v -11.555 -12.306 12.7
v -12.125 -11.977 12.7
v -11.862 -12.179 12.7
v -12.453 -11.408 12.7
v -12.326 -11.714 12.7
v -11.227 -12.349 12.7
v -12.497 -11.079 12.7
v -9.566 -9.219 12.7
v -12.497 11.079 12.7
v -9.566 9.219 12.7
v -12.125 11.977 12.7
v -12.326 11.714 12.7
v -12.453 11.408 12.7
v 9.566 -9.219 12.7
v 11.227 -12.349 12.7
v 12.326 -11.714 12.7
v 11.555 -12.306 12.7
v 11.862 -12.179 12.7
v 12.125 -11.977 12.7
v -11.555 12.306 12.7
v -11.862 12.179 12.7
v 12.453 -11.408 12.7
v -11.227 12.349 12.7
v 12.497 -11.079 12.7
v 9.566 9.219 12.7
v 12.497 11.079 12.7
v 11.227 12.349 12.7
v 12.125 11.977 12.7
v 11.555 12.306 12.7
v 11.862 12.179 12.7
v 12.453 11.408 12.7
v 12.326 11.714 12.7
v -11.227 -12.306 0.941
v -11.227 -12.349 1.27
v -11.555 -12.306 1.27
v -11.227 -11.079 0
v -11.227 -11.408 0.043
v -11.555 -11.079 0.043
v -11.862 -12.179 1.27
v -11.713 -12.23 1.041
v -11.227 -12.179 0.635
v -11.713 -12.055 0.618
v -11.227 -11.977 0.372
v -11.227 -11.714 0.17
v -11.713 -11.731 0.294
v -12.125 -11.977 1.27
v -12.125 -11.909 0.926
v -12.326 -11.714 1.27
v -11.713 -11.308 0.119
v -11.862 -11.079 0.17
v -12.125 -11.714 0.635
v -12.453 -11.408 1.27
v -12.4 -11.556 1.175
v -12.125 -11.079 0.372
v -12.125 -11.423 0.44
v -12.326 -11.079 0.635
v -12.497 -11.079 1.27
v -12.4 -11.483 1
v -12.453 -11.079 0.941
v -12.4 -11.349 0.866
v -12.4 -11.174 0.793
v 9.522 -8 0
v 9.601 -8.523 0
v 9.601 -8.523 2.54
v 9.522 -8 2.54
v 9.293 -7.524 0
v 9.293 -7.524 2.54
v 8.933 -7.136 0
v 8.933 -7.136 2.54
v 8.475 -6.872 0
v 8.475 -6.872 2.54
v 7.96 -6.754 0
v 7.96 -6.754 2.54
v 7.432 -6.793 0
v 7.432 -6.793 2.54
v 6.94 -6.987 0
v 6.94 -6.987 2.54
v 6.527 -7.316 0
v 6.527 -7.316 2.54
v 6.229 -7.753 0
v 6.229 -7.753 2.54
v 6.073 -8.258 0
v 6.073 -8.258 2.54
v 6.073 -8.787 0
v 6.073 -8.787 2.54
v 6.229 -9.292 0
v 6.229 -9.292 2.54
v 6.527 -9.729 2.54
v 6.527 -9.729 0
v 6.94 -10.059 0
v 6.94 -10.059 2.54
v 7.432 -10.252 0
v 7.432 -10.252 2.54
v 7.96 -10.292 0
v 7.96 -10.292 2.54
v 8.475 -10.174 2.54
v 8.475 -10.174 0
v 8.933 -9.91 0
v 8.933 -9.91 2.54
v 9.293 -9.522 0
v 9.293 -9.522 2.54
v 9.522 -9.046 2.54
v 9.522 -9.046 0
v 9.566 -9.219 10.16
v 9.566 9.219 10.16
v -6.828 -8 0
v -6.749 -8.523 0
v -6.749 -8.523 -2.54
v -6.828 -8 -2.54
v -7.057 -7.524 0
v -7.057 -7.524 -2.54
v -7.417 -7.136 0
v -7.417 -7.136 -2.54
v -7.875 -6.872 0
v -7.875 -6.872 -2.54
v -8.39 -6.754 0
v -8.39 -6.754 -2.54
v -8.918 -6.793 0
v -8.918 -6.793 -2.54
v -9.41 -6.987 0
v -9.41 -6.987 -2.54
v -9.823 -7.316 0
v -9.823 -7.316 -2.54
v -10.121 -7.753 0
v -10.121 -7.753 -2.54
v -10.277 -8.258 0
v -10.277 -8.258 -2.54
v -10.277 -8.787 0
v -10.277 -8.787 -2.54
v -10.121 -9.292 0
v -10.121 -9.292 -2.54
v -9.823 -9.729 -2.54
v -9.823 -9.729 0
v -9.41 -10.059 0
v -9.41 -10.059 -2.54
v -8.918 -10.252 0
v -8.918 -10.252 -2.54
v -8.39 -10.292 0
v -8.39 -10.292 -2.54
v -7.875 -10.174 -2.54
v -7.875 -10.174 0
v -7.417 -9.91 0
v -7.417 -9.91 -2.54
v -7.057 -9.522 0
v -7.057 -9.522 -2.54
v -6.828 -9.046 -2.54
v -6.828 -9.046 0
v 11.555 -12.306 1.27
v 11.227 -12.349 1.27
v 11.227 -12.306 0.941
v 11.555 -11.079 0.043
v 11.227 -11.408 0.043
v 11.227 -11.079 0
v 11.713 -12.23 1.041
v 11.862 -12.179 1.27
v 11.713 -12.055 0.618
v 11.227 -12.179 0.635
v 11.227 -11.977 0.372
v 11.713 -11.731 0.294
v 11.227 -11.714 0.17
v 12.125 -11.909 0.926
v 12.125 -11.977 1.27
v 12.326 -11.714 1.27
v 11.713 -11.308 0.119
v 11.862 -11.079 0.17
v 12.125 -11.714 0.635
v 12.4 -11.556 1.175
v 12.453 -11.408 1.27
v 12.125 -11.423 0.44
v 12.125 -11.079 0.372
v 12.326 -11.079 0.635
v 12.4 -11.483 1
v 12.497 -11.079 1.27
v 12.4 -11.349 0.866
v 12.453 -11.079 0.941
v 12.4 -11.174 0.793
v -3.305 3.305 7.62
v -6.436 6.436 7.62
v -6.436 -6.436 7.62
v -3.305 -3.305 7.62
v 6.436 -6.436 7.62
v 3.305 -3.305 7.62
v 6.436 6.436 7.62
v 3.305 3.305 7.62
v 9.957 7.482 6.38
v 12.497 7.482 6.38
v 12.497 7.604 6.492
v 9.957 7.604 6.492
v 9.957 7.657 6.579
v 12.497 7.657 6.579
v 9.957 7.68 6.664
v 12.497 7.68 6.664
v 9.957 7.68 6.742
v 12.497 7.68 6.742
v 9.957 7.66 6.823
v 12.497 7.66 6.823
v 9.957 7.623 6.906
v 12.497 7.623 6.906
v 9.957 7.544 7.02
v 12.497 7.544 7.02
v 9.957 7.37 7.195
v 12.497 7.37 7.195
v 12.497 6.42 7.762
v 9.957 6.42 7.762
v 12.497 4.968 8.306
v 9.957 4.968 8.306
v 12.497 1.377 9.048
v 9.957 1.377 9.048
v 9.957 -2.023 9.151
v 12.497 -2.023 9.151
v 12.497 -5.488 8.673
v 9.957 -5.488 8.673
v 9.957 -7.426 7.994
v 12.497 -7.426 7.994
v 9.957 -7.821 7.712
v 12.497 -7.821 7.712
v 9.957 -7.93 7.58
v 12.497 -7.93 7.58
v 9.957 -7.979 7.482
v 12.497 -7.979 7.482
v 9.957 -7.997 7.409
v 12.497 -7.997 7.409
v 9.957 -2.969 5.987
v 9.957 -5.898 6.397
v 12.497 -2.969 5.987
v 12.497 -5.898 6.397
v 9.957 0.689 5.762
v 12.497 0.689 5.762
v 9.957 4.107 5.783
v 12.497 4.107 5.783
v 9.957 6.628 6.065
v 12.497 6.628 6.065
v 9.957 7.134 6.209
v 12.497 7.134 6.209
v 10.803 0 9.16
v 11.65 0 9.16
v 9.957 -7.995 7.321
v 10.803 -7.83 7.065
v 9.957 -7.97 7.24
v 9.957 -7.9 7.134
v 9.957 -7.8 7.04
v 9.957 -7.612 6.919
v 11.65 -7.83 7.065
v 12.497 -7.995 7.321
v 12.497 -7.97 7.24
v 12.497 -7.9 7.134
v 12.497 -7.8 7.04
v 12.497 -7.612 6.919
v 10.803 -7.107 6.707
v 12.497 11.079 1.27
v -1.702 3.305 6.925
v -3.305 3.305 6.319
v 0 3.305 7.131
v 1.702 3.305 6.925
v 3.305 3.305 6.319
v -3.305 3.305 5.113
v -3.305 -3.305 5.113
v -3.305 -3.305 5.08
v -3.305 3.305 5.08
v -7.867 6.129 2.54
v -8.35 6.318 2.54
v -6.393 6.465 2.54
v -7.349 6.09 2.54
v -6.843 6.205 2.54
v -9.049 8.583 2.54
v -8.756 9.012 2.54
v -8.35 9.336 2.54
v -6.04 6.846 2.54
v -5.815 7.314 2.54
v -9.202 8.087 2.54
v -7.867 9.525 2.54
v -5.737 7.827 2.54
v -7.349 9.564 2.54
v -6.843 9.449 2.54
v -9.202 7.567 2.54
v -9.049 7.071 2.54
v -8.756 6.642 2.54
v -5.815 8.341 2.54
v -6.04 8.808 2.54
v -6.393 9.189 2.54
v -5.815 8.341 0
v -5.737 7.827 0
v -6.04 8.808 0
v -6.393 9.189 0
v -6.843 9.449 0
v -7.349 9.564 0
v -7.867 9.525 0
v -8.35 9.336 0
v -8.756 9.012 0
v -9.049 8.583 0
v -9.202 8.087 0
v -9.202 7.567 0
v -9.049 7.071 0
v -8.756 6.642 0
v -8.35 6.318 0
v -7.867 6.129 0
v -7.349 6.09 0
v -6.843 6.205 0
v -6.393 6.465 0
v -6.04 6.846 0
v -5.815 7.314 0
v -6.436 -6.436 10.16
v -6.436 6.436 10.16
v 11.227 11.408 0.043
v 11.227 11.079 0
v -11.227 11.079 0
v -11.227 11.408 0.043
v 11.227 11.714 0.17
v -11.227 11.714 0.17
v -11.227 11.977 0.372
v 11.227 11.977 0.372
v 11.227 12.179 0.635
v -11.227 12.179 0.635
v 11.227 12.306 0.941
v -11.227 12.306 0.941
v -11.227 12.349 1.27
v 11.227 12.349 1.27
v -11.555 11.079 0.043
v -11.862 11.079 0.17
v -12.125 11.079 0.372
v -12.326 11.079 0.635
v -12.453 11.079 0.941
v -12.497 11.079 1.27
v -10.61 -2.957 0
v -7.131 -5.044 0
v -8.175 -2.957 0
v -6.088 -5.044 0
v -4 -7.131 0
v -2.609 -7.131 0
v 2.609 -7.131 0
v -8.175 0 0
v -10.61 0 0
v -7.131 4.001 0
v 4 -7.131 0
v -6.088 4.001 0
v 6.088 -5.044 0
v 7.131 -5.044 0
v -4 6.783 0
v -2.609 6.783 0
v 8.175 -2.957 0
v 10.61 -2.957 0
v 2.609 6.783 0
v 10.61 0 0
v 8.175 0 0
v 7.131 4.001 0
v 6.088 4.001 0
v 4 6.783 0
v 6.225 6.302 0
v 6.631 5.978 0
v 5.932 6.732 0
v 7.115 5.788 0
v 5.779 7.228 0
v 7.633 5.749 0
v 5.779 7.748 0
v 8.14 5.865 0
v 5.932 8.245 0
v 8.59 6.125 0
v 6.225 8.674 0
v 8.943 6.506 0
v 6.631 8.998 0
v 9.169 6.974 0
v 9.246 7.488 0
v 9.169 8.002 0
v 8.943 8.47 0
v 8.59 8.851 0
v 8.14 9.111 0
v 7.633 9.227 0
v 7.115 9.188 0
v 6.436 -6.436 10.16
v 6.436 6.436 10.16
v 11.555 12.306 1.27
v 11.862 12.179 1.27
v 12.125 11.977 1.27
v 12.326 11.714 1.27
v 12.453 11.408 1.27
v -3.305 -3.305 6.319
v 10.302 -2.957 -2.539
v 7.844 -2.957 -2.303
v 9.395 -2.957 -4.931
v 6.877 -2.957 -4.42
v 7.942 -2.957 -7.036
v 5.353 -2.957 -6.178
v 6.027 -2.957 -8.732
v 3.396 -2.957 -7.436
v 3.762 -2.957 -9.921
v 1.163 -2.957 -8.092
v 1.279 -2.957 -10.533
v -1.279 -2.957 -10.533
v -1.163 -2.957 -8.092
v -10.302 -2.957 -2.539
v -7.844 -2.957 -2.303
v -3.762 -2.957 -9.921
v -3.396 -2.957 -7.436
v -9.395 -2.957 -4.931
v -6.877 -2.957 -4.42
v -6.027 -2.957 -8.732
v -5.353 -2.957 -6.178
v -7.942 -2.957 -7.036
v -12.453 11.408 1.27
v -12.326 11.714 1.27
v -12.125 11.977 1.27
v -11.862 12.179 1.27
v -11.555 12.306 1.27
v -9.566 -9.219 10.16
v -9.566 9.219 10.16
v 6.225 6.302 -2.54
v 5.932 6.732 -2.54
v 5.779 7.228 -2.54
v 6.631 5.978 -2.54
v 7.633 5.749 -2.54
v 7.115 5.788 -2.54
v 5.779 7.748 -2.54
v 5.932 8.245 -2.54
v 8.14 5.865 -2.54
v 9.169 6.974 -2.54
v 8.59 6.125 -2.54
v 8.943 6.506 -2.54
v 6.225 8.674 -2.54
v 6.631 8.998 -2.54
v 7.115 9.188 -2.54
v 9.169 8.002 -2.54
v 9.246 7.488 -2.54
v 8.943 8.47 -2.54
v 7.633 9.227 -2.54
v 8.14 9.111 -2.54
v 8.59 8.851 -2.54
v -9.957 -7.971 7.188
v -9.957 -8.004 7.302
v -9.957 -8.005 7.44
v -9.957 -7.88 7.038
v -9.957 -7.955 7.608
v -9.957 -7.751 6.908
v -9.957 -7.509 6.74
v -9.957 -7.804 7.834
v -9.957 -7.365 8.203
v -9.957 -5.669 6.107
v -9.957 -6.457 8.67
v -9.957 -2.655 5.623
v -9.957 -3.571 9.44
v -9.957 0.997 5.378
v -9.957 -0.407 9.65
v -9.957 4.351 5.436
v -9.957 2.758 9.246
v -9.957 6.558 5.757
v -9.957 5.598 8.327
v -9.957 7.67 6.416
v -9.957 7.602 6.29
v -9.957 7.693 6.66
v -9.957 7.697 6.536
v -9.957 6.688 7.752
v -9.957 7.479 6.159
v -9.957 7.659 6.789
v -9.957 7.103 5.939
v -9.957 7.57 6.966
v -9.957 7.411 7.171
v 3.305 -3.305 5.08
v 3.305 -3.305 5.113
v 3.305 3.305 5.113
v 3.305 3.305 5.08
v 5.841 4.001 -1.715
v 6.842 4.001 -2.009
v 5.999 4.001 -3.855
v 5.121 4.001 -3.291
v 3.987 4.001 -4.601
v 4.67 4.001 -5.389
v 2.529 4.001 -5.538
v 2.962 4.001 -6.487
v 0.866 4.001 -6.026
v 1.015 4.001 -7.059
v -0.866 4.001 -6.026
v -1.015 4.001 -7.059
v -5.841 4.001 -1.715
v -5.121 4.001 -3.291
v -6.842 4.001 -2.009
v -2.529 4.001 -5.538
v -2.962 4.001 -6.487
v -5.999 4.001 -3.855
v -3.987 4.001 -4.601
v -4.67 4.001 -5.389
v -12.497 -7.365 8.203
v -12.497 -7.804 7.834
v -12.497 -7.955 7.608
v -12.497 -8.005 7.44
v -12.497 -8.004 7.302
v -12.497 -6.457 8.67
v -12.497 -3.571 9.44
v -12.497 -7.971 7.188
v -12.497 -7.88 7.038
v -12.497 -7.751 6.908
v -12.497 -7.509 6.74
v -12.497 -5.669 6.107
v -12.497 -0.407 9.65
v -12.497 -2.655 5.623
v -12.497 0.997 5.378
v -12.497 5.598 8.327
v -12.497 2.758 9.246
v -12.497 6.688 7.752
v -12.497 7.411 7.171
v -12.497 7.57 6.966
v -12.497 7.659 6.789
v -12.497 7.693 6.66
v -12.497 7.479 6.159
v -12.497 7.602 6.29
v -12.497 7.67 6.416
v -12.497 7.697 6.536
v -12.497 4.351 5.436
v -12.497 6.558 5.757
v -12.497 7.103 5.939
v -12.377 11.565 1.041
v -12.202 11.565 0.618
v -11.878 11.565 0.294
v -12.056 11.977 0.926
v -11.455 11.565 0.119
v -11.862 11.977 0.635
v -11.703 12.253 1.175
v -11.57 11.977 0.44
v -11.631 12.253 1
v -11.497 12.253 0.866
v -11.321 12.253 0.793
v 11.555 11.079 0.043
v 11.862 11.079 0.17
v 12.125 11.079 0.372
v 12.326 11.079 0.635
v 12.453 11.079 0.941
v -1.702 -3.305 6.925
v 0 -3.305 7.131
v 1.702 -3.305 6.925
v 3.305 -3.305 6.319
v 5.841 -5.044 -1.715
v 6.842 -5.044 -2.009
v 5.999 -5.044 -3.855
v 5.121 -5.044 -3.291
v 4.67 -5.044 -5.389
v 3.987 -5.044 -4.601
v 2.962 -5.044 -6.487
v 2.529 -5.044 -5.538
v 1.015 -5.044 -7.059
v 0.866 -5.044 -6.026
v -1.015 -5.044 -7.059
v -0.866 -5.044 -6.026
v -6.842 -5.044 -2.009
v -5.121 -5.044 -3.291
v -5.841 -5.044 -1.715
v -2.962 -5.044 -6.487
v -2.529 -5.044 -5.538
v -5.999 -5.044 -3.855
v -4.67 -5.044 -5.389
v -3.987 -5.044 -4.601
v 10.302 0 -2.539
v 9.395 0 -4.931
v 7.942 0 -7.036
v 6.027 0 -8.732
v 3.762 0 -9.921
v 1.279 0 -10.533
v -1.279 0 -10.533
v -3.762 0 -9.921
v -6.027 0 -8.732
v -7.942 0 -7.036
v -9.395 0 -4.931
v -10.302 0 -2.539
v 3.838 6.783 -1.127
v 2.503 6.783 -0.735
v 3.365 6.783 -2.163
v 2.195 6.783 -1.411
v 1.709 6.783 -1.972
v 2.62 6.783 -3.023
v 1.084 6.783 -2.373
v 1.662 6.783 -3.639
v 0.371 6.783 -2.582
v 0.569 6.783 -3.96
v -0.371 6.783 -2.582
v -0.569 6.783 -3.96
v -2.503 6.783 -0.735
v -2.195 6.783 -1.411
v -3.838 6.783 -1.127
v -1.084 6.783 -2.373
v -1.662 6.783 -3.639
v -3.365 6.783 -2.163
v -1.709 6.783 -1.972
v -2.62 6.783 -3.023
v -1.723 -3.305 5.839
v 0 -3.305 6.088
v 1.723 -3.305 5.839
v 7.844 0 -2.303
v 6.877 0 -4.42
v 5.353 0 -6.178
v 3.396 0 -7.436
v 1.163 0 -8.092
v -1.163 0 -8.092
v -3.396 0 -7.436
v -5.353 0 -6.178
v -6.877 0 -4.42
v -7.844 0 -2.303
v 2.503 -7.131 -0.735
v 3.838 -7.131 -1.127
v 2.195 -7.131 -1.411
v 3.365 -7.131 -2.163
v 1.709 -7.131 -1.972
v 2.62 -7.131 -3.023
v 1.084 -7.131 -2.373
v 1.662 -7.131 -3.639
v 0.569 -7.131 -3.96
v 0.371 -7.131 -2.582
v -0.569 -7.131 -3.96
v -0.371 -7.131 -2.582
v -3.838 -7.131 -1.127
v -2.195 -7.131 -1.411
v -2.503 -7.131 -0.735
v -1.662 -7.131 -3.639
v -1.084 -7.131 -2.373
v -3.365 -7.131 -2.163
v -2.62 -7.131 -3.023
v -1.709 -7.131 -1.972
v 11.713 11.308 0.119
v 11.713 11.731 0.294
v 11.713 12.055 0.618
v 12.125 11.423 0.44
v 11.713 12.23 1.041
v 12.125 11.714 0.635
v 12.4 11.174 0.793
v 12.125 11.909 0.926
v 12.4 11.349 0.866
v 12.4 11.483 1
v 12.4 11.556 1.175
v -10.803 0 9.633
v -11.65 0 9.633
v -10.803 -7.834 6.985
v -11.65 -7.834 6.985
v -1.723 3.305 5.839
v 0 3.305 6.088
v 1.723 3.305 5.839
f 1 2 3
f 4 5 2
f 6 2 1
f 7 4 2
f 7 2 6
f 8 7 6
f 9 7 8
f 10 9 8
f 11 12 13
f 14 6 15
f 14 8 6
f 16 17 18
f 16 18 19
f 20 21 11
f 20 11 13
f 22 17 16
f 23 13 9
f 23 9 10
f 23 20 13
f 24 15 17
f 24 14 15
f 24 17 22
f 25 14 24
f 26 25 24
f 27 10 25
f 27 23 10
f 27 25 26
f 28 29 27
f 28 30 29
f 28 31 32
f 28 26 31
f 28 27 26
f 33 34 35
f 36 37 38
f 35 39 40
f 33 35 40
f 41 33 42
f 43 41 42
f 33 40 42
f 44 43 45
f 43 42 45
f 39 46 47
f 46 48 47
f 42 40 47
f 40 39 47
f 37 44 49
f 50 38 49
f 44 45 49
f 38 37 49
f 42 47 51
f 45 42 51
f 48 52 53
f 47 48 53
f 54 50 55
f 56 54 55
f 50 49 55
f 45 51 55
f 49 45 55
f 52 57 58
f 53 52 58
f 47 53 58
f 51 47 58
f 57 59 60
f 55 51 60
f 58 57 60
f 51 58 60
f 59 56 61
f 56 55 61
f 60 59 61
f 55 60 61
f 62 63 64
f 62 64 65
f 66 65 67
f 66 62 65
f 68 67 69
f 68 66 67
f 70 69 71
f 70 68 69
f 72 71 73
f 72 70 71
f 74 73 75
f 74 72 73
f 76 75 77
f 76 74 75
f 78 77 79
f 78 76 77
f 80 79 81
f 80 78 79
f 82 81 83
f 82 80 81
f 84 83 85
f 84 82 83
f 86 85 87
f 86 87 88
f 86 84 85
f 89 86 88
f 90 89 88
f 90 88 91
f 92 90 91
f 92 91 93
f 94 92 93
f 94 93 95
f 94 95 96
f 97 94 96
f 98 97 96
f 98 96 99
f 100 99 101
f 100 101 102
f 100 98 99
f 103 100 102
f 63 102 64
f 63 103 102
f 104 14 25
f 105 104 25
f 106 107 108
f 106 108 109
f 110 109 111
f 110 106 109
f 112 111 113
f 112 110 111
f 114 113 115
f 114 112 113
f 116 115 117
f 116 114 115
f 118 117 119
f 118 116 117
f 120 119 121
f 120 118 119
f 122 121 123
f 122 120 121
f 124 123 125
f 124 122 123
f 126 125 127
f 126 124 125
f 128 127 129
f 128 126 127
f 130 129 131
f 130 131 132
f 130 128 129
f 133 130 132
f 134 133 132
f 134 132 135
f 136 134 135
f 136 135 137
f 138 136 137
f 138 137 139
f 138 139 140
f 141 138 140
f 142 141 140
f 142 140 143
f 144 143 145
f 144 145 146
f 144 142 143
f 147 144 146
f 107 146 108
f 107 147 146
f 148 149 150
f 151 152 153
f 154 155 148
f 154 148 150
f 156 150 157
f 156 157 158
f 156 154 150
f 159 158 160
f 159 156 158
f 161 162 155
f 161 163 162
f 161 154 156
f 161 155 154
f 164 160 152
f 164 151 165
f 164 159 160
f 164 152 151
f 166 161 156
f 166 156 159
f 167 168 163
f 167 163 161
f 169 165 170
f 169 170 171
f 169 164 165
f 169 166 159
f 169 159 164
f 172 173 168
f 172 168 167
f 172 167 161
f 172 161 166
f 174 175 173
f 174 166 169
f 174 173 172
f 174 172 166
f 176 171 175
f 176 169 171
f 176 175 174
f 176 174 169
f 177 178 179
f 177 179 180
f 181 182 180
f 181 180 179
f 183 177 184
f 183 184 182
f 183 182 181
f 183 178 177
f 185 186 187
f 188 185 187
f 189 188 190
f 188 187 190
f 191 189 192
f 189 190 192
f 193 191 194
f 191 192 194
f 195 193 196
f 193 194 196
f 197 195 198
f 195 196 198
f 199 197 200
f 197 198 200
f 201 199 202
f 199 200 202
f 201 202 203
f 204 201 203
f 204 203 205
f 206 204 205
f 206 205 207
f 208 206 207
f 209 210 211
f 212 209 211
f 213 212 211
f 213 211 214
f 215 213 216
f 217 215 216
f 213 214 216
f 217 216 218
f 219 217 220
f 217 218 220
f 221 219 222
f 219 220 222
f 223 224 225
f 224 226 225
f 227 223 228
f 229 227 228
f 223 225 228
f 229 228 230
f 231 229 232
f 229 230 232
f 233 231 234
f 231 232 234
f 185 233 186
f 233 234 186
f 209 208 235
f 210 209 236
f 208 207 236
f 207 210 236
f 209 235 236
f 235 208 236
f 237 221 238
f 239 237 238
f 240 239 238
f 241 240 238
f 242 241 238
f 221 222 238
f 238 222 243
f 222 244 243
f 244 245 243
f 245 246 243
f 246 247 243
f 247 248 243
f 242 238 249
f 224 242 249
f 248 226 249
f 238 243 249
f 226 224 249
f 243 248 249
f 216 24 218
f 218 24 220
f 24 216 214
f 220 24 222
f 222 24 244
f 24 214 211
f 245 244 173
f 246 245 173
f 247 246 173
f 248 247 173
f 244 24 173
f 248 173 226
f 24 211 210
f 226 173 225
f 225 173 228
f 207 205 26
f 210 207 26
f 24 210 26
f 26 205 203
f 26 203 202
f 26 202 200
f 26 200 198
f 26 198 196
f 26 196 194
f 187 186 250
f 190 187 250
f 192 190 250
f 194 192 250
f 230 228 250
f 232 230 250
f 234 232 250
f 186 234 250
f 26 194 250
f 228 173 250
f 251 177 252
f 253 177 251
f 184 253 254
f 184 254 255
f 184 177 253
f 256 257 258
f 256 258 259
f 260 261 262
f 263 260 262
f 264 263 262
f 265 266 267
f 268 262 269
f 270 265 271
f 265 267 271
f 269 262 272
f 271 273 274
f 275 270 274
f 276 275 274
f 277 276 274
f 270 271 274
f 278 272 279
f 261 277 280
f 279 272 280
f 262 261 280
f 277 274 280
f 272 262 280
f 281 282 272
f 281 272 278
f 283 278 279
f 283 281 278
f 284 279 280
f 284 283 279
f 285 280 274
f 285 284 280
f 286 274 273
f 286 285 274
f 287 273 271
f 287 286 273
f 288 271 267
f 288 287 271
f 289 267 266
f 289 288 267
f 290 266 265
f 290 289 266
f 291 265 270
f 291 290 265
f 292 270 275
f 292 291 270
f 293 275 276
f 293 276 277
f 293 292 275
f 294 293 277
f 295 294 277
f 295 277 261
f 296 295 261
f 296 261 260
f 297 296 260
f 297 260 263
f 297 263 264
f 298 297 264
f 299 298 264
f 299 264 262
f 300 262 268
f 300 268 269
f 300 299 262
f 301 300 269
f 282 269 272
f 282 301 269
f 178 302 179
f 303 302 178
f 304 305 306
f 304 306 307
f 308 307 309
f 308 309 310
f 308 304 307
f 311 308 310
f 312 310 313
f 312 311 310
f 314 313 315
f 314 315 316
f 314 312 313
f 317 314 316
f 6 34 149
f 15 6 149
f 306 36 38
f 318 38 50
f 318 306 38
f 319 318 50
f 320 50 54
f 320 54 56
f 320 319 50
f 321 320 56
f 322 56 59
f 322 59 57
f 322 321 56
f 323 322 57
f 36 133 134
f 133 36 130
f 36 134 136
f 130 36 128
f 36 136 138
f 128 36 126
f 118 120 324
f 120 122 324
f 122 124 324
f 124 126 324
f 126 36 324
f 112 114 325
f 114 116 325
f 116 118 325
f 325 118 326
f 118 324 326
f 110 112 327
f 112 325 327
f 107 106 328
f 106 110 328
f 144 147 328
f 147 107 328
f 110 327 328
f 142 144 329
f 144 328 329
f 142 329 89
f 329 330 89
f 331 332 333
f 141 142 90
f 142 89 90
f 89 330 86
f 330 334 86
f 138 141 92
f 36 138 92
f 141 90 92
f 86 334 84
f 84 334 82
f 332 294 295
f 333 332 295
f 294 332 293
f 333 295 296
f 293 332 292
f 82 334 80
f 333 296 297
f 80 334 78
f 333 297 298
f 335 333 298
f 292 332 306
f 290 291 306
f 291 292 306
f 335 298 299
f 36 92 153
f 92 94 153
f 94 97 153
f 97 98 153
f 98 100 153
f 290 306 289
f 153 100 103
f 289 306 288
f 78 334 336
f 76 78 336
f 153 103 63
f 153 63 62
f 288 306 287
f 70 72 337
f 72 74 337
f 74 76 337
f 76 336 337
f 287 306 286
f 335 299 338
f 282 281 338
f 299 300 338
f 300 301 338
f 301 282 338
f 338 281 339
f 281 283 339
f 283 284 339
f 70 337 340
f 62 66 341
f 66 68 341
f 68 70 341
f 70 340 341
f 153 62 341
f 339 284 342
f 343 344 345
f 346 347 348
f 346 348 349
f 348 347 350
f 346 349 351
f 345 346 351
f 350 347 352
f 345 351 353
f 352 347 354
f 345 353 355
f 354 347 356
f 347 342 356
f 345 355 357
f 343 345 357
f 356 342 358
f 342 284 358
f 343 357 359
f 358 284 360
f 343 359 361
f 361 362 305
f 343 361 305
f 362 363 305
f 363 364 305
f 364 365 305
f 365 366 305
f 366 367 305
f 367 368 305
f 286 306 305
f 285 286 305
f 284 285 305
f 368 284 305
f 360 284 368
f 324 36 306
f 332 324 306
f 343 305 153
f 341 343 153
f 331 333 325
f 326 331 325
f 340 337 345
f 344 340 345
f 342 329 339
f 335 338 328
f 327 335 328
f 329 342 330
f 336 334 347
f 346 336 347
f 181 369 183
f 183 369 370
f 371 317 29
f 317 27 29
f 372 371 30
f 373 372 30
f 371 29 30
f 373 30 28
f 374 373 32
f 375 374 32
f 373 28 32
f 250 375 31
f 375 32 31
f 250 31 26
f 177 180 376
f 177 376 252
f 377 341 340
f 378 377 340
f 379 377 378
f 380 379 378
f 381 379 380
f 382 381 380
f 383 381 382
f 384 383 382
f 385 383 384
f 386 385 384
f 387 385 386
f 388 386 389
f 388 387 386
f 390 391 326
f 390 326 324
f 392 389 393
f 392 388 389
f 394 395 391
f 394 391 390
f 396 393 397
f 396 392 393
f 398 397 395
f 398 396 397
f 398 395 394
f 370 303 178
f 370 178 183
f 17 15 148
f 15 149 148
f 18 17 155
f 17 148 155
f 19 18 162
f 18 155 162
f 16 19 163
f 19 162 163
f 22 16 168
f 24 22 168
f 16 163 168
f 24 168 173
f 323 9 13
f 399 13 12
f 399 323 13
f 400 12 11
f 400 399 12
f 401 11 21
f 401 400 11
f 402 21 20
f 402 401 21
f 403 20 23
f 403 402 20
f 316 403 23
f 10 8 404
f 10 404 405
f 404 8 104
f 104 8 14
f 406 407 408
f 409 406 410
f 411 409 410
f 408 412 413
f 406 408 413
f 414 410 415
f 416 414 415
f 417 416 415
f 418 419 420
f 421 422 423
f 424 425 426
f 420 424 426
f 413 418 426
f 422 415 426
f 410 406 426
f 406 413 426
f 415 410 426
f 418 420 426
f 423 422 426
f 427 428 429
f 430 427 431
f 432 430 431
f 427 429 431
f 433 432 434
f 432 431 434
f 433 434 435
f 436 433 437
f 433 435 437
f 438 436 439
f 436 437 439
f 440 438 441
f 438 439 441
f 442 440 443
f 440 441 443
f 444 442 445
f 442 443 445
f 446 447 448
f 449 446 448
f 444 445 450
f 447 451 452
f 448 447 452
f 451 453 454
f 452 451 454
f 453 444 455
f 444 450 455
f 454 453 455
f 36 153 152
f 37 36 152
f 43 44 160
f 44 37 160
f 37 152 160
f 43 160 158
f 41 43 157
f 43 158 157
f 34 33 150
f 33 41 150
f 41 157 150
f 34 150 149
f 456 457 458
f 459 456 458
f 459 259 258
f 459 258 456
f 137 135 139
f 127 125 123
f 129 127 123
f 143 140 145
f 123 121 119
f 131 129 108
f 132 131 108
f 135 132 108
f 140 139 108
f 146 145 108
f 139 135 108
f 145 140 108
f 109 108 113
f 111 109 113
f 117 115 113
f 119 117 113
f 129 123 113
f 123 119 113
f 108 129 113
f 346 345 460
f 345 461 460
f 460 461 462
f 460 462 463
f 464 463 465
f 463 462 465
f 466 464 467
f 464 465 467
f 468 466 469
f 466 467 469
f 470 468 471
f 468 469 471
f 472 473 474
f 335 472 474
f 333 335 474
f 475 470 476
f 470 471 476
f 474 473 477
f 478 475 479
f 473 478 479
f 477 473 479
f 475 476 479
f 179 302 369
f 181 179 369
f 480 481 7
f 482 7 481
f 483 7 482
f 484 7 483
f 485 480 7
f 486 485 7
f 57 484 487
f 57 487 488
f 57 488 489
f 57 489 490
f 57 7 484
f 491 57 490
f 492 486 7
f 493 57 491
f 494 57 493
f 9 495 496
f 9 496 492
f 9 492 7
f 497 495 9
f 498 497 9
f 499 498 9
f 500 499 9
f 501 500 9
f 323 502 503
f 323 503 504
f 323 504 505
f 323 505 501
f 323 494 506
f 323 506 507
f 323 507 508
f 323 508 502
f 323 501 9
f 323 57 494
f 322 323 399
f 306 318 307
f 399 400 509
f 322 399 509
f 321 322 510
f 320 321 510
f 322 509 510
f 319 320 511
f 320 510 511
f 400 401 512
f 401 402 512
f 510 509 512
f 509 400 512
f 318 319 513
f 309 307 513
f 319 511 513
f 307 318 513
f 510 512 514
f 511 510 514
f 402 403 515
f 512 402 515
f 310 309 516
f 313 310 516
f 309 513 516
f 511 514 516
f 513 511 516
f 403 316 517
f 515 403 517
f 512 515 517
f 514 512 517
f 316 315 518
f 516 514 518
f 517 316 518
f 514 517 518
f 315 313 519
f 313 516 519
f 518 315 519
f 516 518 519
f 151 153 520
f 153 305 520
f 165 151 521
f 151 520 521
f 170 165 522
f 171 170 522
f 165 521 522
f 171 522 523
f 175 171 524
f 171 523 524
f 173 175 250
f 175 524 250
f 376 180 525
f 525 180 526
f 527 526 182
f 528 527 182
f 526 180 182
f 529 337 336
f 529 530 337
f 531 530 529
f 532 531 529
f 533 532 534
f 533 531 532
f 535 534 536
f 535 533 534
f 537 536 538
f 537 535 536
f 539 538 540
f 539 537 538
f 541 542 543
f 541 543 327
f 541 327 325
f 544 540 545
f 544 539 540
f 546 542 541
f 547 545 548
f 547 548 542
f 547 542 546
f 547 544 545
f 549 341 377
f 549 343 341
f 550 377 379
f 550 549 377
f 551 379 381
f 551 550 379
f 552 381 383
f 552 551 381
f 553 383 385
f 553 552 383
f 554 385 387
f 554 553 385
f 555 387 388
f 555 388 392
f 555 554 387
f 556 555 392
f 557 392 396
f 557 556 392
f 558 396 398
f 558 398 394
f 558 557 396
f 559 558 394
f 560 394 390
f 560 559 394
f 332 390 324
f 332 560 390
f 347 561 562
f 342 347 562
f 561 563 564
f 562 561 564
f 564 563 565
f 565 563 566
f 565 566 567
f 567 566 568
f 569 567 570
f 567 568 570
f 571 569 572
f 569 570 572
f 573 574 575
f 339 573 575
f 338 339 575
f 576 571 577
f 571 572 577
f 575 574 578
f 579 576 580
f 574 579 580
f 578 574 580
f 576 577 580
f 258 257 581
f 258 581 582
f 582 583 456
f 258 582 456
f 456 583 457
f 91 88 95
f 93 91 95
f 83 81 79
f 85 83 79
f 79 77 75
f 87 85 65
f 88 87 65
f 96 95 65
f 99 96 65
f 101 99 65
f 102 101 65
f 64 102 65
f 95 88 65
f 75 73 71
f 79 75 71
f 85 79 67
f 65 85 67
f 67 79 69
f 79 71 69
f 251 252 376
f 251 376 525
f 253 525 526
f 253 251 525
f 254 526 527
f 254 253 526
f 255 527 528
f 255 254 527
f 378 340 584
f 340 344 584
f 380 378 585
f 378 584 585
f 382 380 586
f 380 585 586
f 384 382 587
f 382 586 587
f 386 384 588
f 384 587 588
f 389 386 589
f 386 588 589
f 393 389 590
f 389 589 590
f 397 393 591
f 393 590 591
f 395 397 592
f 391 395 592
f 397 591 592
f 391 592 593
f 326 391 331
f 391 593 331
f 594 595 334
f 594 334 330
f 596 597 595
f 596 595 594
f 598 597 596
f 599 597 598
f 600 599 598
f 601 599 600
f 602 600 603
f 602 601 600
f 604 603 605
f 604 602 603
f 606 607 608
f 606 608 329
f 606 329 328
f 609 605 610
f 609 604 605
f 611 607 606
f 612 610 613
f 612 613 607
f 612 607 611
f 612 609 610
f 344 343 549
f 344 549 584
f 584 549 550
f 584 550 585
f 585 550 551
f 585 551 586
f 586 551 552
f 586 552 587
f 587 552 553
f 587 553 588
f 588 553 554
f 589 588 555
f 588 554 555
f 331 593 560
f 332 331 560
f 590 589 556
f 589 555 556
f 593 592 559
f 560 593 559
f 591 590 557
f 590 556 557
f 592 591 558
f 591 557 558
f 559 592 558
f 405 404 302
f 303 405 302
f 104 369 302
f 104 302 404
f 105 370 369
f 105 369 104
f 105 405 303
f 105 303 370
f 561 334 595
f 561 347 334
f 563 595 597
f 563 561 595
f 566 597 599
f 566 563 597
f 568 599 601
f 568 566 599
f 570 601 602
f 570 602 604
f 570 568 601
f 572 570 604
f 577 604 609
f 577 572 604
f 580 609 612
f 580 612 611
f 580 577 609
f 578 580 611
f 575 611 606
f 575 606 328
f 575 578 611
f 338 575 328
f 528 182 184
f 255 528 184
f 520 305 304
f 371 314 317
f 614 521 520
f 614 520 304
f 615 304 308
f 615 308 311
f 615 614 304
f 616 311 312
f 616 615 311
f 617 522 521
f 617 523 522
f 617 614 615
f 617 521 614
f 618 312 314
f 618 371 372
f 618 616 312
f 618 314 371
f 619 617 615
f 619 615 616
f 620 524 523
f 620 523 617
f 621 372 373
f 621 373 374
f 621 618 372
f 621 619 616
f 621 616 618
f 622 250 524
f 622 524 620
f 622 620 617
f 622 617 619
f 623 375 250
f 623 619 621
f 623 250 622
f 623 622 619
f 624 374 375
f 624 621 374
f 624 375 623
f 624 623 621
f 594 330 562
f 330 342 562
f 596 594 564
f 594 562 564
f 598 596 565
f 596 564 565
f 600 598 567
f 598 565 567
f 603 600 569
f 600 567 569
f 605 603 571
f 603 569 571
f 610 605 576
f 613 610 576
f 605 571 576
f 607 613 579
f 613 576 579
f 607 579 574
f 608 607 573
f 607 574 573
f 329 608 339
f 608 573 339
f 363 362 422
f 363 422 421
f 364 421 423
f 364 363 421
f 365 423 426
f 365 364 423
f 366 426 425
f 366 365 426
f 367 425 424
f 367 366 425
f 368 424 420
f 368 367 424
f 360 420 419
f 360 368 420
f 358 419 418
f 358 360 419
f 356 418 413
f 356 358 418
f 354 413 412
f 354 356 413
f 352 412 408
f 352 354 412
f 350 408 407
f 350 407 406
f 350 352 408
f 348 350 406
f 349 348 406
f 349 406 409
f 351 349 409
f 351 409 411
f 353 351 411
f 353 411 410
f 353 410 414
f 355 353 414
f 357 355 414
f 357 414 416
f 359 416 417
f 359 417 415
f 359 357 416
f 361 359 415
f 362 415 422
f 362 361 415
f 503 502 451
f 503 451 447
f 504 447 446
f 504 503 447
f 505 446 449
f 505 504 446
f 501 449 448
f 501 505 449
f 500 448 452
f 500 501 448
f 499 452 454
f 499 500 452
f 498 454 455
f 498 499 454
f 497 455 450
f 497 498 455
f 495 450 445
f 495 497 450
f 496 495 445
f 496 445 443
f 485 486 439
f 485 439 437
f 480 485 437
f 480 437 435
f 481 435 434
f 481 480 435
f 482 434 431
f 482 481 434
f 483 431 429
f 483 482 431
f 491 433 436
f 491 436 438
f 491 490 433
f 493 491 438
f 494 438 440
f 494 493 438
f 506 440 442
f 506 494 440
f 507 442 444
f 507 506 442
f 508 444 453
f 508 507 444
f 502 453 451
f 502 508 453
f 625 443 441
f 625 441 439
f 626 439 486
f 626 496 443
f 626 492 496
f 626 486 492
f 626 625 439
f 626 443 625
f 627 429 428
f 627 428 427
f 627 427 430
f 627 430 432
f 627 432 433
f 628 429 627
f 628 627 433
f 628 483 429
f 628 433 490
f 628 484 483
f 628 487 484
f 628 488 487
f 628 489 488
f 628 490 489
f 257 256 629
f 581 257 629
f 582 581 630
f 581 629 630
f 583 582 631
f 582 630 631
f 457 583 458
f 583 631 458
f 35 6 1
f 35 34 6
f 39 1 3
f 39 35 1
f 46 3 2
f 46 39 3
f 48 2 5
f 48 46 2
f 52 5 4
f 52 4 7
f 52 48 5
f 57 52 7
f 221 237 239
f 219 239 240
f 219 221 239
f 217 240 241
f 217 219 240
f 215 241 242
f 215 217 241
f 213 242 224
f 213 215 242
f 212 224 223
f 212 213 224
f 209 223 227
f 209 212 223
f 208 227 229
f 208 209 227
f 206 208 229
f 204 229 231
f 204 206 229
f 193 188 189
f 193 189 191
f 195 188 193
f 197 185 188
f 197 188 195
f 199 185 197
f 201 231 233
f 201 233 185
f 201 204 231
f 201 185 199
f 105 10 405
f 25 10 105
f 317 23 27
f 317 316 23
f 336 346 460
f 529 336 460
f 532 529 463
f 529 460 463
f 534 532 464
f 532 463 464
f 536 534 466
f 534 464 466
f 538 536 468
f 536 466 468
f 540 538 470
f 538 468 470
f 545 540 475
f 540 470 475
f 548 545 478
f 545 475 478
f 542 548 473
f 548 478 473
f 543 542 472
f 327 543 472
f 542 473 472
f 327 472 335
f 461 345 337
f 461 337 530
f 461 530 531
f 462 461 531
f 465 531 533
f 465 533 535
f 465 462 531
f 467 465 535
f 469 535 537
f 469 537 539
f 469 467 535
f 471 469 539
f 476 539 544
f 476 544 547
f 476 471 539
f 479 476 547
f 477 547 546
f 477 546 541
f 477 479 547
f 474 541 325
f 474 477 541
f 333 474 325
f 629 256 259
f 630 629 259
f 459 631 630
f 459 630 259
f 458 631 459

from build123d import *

# Parameters (mm, degrees)
F0_W      = 24.9930880964
F0_H      = 24.6987380087
F1_DEPTH  = 12.7
F2_W      = 19.1328264773
F2_H      = 18.4370856732
F3_DEPTH  = 2.54
F4_W      = 12.8711769357
F4_H      = 12.8711741418
F5_DEPTH  = 2.54
F6_W      = 6.6095204093
F6_H      = 6.6095213406
F7_DEPTH  = 2.54
F8_W      = 1.3914771844
F8_H      = 13.9147825539
F9_ANGLE  = 180
F10_W     = 1.0436060838
F10_H     = 9.0446090326
F12_W     = 2.4350825697
F12_H     = 2.9568914324
F13_ANGLE = 180
F14_R     = 1.27
F15_R     = 1.27
F16_R     = 1.27
F17_R     = 1.27
F18_R     = 1.7737932194
F18_R_2   = 1.7435308636
F19_DEPTH = 2.54
F18_R_3   = 1.7420613373
F18_R_4   = 1.7737943152
F20_DEPTH = 2.54
F22_DEPTH = 2.54
F24_DEPTH = 2.54


with BuildPart() as f1:
    # F0 (on Top) → F1 (new body)
    with BuildSketch(Plane.XY):
        Rectangle(F0_W, F0_H)
    extrude(amount=F1_DEPTH)

    # F2 (on face) → F3 (cut)
    with BuildSketch(Plane.XY.offset(12.7)):
        Rectangle(F2_W, F2_H)
    extrude(amount=-F3_DEPTH, mode=Mode.SUBTRACT)

    # F4 (on face) → F5 (cut)
    with BuildSketch(Plane.XY.offset(10.16)):
        Rectangle(F4_W, F4_H)
    extrude(amount=-F5_DEPTH, mode=Mode.SUBTRACT)

    # F6 (on face) → F7 (cut)
    with BuildSketch(Plane.XY.offset(7.62)):
        Rectangle(F6_W, F6_H)
    extrude(amount=-F7_DEPTH, mode=Mode.SUBTRACT)

    # F8 (on Top) → F9 (revolve)
    with BuildSketch(Plane.XY):
        with Locations((3.304760321, -0.1739347354)):
            Rectangle(F8_W, F8_H)
    revolve(axis=Axis((0, -0.1739347354, 0), (0, 1, 0)), revolution_arc=F9_ANGLE)

    # F10 (on Top) → F11 (revolve)
    with BuildSketch(Plane.XY):
        with Locations((6.6095206421, -0.5218042061)):
            Rectangle(F10_W, F10_H)
    revolve(axis=Axis((0, -0.8696736768, 0), (0, 1, 0)))

    # F12 (on Top) → F13 (revolve)
    with BuildSketch(Plane.XY):
        with Locations((9.392477572, -1.4784457162)):
            Rectangle(F12_W, F12_H)
    revolve(axis=Axis((0, -0.5218046717, 0), (0, 1, 0)), revolution_arc=F13_ANGLE)

    # F14
    f14_edges = [f1.edges().sort_by_distance(p)[0] for p in [
        (0, -12.349369, 0),
    ]]
    fillet(f14_edges, radius=F14_R)

    # F15
    f15_edges = [f1.edges().sort_by_distance(p)[0] for p in [
        (-12.496544, 0.635, 0),
    ]]
    fillet(f15_edges, radius=F15_R)

    # F16
    f16_edges = [f1.edges().sort_by_distance(p)[0] for p in [
        (0.635, 12.349369, 0),
    ]]
    fillet(f16_edges, radius=F16_R)

    # F17
    f17_edges = [f1.edges().sort_by_distance(p)[0] for p in [
        (12.496544, 0, 0),
    ]]
    fillet(f17_edges, radius=F17_R)

    # F18 (on Top) → F19 (join)
    with BuildSketch(Plane.XY):
        with Locations((-8.5228066891, -8.5228048265)):
            Circle(F18_R)
        with Locations((7.5027854182, 7.4880854227)):
            Circle(F18_R_2)
    extrude(amount=-F19_DEPTH)

    # F18 (on Top) → F20 (cut)
    with BuildSketch(Plane.XY):
        with Locations((-7.4791945517, 7.8270649537)):
            Circle(F18_R_3)
        with Locations((7.8270649537, -8.5228048265)):
            Circle(F18_R_4)
    extrude(amount=F20_DEPTH, mode=Mode.SUBTRACT)

    # F21 (on face) → F22 (cut)
    with BuildSketch(Plane.YZ.offset(12.4965440482)):
        with BuildLine():
            add(Edge.make_bspline(
                [(7.4816909619, 6.3803573139), (8.6678256626, 7.222641581), (0.0654100682, 10.7050572044), (-15.1471126917, 6.1563977773), (5.8379660659, 5.2131343851), (7.4816909619, 6.3803573139)],
                knots=[0, 0, 0, 0, 0.294675987, 0.5916431282, 1, 1, 1, 1], degree=3))
        make_face()
    extrude(amount=-F22_DEPTH, mode=Mode.SUBTRACT)

    # F23 (on face) → F24 (cut)
    with BuildSketch(Plane(origin=(-12.4965440482, 0, 0), x_dir=(0, -1, 0), z_dir=(-1, 0, 0))):
        with BuildLine():
            add(Edge.make_bspline(
                [(-7.4785943143, 6.1592552811), (-8.7327498412, 7.2143790552), (-0.1044548846, 11.5753450744), (15.146698404, 5.8495465933), (-5.7683471063, 4.7204205831), (-7.4785943143, 6.1592552811)],
                knots=[0, 0, 0, 0, 0.2971718348, 0.5947573567, 1, 1, 1, 1], degree=3))
        make_face()
    extrude(amount=-F24_DEPTH, mode=Mode.SUBTRACT)


solid = f1.part
